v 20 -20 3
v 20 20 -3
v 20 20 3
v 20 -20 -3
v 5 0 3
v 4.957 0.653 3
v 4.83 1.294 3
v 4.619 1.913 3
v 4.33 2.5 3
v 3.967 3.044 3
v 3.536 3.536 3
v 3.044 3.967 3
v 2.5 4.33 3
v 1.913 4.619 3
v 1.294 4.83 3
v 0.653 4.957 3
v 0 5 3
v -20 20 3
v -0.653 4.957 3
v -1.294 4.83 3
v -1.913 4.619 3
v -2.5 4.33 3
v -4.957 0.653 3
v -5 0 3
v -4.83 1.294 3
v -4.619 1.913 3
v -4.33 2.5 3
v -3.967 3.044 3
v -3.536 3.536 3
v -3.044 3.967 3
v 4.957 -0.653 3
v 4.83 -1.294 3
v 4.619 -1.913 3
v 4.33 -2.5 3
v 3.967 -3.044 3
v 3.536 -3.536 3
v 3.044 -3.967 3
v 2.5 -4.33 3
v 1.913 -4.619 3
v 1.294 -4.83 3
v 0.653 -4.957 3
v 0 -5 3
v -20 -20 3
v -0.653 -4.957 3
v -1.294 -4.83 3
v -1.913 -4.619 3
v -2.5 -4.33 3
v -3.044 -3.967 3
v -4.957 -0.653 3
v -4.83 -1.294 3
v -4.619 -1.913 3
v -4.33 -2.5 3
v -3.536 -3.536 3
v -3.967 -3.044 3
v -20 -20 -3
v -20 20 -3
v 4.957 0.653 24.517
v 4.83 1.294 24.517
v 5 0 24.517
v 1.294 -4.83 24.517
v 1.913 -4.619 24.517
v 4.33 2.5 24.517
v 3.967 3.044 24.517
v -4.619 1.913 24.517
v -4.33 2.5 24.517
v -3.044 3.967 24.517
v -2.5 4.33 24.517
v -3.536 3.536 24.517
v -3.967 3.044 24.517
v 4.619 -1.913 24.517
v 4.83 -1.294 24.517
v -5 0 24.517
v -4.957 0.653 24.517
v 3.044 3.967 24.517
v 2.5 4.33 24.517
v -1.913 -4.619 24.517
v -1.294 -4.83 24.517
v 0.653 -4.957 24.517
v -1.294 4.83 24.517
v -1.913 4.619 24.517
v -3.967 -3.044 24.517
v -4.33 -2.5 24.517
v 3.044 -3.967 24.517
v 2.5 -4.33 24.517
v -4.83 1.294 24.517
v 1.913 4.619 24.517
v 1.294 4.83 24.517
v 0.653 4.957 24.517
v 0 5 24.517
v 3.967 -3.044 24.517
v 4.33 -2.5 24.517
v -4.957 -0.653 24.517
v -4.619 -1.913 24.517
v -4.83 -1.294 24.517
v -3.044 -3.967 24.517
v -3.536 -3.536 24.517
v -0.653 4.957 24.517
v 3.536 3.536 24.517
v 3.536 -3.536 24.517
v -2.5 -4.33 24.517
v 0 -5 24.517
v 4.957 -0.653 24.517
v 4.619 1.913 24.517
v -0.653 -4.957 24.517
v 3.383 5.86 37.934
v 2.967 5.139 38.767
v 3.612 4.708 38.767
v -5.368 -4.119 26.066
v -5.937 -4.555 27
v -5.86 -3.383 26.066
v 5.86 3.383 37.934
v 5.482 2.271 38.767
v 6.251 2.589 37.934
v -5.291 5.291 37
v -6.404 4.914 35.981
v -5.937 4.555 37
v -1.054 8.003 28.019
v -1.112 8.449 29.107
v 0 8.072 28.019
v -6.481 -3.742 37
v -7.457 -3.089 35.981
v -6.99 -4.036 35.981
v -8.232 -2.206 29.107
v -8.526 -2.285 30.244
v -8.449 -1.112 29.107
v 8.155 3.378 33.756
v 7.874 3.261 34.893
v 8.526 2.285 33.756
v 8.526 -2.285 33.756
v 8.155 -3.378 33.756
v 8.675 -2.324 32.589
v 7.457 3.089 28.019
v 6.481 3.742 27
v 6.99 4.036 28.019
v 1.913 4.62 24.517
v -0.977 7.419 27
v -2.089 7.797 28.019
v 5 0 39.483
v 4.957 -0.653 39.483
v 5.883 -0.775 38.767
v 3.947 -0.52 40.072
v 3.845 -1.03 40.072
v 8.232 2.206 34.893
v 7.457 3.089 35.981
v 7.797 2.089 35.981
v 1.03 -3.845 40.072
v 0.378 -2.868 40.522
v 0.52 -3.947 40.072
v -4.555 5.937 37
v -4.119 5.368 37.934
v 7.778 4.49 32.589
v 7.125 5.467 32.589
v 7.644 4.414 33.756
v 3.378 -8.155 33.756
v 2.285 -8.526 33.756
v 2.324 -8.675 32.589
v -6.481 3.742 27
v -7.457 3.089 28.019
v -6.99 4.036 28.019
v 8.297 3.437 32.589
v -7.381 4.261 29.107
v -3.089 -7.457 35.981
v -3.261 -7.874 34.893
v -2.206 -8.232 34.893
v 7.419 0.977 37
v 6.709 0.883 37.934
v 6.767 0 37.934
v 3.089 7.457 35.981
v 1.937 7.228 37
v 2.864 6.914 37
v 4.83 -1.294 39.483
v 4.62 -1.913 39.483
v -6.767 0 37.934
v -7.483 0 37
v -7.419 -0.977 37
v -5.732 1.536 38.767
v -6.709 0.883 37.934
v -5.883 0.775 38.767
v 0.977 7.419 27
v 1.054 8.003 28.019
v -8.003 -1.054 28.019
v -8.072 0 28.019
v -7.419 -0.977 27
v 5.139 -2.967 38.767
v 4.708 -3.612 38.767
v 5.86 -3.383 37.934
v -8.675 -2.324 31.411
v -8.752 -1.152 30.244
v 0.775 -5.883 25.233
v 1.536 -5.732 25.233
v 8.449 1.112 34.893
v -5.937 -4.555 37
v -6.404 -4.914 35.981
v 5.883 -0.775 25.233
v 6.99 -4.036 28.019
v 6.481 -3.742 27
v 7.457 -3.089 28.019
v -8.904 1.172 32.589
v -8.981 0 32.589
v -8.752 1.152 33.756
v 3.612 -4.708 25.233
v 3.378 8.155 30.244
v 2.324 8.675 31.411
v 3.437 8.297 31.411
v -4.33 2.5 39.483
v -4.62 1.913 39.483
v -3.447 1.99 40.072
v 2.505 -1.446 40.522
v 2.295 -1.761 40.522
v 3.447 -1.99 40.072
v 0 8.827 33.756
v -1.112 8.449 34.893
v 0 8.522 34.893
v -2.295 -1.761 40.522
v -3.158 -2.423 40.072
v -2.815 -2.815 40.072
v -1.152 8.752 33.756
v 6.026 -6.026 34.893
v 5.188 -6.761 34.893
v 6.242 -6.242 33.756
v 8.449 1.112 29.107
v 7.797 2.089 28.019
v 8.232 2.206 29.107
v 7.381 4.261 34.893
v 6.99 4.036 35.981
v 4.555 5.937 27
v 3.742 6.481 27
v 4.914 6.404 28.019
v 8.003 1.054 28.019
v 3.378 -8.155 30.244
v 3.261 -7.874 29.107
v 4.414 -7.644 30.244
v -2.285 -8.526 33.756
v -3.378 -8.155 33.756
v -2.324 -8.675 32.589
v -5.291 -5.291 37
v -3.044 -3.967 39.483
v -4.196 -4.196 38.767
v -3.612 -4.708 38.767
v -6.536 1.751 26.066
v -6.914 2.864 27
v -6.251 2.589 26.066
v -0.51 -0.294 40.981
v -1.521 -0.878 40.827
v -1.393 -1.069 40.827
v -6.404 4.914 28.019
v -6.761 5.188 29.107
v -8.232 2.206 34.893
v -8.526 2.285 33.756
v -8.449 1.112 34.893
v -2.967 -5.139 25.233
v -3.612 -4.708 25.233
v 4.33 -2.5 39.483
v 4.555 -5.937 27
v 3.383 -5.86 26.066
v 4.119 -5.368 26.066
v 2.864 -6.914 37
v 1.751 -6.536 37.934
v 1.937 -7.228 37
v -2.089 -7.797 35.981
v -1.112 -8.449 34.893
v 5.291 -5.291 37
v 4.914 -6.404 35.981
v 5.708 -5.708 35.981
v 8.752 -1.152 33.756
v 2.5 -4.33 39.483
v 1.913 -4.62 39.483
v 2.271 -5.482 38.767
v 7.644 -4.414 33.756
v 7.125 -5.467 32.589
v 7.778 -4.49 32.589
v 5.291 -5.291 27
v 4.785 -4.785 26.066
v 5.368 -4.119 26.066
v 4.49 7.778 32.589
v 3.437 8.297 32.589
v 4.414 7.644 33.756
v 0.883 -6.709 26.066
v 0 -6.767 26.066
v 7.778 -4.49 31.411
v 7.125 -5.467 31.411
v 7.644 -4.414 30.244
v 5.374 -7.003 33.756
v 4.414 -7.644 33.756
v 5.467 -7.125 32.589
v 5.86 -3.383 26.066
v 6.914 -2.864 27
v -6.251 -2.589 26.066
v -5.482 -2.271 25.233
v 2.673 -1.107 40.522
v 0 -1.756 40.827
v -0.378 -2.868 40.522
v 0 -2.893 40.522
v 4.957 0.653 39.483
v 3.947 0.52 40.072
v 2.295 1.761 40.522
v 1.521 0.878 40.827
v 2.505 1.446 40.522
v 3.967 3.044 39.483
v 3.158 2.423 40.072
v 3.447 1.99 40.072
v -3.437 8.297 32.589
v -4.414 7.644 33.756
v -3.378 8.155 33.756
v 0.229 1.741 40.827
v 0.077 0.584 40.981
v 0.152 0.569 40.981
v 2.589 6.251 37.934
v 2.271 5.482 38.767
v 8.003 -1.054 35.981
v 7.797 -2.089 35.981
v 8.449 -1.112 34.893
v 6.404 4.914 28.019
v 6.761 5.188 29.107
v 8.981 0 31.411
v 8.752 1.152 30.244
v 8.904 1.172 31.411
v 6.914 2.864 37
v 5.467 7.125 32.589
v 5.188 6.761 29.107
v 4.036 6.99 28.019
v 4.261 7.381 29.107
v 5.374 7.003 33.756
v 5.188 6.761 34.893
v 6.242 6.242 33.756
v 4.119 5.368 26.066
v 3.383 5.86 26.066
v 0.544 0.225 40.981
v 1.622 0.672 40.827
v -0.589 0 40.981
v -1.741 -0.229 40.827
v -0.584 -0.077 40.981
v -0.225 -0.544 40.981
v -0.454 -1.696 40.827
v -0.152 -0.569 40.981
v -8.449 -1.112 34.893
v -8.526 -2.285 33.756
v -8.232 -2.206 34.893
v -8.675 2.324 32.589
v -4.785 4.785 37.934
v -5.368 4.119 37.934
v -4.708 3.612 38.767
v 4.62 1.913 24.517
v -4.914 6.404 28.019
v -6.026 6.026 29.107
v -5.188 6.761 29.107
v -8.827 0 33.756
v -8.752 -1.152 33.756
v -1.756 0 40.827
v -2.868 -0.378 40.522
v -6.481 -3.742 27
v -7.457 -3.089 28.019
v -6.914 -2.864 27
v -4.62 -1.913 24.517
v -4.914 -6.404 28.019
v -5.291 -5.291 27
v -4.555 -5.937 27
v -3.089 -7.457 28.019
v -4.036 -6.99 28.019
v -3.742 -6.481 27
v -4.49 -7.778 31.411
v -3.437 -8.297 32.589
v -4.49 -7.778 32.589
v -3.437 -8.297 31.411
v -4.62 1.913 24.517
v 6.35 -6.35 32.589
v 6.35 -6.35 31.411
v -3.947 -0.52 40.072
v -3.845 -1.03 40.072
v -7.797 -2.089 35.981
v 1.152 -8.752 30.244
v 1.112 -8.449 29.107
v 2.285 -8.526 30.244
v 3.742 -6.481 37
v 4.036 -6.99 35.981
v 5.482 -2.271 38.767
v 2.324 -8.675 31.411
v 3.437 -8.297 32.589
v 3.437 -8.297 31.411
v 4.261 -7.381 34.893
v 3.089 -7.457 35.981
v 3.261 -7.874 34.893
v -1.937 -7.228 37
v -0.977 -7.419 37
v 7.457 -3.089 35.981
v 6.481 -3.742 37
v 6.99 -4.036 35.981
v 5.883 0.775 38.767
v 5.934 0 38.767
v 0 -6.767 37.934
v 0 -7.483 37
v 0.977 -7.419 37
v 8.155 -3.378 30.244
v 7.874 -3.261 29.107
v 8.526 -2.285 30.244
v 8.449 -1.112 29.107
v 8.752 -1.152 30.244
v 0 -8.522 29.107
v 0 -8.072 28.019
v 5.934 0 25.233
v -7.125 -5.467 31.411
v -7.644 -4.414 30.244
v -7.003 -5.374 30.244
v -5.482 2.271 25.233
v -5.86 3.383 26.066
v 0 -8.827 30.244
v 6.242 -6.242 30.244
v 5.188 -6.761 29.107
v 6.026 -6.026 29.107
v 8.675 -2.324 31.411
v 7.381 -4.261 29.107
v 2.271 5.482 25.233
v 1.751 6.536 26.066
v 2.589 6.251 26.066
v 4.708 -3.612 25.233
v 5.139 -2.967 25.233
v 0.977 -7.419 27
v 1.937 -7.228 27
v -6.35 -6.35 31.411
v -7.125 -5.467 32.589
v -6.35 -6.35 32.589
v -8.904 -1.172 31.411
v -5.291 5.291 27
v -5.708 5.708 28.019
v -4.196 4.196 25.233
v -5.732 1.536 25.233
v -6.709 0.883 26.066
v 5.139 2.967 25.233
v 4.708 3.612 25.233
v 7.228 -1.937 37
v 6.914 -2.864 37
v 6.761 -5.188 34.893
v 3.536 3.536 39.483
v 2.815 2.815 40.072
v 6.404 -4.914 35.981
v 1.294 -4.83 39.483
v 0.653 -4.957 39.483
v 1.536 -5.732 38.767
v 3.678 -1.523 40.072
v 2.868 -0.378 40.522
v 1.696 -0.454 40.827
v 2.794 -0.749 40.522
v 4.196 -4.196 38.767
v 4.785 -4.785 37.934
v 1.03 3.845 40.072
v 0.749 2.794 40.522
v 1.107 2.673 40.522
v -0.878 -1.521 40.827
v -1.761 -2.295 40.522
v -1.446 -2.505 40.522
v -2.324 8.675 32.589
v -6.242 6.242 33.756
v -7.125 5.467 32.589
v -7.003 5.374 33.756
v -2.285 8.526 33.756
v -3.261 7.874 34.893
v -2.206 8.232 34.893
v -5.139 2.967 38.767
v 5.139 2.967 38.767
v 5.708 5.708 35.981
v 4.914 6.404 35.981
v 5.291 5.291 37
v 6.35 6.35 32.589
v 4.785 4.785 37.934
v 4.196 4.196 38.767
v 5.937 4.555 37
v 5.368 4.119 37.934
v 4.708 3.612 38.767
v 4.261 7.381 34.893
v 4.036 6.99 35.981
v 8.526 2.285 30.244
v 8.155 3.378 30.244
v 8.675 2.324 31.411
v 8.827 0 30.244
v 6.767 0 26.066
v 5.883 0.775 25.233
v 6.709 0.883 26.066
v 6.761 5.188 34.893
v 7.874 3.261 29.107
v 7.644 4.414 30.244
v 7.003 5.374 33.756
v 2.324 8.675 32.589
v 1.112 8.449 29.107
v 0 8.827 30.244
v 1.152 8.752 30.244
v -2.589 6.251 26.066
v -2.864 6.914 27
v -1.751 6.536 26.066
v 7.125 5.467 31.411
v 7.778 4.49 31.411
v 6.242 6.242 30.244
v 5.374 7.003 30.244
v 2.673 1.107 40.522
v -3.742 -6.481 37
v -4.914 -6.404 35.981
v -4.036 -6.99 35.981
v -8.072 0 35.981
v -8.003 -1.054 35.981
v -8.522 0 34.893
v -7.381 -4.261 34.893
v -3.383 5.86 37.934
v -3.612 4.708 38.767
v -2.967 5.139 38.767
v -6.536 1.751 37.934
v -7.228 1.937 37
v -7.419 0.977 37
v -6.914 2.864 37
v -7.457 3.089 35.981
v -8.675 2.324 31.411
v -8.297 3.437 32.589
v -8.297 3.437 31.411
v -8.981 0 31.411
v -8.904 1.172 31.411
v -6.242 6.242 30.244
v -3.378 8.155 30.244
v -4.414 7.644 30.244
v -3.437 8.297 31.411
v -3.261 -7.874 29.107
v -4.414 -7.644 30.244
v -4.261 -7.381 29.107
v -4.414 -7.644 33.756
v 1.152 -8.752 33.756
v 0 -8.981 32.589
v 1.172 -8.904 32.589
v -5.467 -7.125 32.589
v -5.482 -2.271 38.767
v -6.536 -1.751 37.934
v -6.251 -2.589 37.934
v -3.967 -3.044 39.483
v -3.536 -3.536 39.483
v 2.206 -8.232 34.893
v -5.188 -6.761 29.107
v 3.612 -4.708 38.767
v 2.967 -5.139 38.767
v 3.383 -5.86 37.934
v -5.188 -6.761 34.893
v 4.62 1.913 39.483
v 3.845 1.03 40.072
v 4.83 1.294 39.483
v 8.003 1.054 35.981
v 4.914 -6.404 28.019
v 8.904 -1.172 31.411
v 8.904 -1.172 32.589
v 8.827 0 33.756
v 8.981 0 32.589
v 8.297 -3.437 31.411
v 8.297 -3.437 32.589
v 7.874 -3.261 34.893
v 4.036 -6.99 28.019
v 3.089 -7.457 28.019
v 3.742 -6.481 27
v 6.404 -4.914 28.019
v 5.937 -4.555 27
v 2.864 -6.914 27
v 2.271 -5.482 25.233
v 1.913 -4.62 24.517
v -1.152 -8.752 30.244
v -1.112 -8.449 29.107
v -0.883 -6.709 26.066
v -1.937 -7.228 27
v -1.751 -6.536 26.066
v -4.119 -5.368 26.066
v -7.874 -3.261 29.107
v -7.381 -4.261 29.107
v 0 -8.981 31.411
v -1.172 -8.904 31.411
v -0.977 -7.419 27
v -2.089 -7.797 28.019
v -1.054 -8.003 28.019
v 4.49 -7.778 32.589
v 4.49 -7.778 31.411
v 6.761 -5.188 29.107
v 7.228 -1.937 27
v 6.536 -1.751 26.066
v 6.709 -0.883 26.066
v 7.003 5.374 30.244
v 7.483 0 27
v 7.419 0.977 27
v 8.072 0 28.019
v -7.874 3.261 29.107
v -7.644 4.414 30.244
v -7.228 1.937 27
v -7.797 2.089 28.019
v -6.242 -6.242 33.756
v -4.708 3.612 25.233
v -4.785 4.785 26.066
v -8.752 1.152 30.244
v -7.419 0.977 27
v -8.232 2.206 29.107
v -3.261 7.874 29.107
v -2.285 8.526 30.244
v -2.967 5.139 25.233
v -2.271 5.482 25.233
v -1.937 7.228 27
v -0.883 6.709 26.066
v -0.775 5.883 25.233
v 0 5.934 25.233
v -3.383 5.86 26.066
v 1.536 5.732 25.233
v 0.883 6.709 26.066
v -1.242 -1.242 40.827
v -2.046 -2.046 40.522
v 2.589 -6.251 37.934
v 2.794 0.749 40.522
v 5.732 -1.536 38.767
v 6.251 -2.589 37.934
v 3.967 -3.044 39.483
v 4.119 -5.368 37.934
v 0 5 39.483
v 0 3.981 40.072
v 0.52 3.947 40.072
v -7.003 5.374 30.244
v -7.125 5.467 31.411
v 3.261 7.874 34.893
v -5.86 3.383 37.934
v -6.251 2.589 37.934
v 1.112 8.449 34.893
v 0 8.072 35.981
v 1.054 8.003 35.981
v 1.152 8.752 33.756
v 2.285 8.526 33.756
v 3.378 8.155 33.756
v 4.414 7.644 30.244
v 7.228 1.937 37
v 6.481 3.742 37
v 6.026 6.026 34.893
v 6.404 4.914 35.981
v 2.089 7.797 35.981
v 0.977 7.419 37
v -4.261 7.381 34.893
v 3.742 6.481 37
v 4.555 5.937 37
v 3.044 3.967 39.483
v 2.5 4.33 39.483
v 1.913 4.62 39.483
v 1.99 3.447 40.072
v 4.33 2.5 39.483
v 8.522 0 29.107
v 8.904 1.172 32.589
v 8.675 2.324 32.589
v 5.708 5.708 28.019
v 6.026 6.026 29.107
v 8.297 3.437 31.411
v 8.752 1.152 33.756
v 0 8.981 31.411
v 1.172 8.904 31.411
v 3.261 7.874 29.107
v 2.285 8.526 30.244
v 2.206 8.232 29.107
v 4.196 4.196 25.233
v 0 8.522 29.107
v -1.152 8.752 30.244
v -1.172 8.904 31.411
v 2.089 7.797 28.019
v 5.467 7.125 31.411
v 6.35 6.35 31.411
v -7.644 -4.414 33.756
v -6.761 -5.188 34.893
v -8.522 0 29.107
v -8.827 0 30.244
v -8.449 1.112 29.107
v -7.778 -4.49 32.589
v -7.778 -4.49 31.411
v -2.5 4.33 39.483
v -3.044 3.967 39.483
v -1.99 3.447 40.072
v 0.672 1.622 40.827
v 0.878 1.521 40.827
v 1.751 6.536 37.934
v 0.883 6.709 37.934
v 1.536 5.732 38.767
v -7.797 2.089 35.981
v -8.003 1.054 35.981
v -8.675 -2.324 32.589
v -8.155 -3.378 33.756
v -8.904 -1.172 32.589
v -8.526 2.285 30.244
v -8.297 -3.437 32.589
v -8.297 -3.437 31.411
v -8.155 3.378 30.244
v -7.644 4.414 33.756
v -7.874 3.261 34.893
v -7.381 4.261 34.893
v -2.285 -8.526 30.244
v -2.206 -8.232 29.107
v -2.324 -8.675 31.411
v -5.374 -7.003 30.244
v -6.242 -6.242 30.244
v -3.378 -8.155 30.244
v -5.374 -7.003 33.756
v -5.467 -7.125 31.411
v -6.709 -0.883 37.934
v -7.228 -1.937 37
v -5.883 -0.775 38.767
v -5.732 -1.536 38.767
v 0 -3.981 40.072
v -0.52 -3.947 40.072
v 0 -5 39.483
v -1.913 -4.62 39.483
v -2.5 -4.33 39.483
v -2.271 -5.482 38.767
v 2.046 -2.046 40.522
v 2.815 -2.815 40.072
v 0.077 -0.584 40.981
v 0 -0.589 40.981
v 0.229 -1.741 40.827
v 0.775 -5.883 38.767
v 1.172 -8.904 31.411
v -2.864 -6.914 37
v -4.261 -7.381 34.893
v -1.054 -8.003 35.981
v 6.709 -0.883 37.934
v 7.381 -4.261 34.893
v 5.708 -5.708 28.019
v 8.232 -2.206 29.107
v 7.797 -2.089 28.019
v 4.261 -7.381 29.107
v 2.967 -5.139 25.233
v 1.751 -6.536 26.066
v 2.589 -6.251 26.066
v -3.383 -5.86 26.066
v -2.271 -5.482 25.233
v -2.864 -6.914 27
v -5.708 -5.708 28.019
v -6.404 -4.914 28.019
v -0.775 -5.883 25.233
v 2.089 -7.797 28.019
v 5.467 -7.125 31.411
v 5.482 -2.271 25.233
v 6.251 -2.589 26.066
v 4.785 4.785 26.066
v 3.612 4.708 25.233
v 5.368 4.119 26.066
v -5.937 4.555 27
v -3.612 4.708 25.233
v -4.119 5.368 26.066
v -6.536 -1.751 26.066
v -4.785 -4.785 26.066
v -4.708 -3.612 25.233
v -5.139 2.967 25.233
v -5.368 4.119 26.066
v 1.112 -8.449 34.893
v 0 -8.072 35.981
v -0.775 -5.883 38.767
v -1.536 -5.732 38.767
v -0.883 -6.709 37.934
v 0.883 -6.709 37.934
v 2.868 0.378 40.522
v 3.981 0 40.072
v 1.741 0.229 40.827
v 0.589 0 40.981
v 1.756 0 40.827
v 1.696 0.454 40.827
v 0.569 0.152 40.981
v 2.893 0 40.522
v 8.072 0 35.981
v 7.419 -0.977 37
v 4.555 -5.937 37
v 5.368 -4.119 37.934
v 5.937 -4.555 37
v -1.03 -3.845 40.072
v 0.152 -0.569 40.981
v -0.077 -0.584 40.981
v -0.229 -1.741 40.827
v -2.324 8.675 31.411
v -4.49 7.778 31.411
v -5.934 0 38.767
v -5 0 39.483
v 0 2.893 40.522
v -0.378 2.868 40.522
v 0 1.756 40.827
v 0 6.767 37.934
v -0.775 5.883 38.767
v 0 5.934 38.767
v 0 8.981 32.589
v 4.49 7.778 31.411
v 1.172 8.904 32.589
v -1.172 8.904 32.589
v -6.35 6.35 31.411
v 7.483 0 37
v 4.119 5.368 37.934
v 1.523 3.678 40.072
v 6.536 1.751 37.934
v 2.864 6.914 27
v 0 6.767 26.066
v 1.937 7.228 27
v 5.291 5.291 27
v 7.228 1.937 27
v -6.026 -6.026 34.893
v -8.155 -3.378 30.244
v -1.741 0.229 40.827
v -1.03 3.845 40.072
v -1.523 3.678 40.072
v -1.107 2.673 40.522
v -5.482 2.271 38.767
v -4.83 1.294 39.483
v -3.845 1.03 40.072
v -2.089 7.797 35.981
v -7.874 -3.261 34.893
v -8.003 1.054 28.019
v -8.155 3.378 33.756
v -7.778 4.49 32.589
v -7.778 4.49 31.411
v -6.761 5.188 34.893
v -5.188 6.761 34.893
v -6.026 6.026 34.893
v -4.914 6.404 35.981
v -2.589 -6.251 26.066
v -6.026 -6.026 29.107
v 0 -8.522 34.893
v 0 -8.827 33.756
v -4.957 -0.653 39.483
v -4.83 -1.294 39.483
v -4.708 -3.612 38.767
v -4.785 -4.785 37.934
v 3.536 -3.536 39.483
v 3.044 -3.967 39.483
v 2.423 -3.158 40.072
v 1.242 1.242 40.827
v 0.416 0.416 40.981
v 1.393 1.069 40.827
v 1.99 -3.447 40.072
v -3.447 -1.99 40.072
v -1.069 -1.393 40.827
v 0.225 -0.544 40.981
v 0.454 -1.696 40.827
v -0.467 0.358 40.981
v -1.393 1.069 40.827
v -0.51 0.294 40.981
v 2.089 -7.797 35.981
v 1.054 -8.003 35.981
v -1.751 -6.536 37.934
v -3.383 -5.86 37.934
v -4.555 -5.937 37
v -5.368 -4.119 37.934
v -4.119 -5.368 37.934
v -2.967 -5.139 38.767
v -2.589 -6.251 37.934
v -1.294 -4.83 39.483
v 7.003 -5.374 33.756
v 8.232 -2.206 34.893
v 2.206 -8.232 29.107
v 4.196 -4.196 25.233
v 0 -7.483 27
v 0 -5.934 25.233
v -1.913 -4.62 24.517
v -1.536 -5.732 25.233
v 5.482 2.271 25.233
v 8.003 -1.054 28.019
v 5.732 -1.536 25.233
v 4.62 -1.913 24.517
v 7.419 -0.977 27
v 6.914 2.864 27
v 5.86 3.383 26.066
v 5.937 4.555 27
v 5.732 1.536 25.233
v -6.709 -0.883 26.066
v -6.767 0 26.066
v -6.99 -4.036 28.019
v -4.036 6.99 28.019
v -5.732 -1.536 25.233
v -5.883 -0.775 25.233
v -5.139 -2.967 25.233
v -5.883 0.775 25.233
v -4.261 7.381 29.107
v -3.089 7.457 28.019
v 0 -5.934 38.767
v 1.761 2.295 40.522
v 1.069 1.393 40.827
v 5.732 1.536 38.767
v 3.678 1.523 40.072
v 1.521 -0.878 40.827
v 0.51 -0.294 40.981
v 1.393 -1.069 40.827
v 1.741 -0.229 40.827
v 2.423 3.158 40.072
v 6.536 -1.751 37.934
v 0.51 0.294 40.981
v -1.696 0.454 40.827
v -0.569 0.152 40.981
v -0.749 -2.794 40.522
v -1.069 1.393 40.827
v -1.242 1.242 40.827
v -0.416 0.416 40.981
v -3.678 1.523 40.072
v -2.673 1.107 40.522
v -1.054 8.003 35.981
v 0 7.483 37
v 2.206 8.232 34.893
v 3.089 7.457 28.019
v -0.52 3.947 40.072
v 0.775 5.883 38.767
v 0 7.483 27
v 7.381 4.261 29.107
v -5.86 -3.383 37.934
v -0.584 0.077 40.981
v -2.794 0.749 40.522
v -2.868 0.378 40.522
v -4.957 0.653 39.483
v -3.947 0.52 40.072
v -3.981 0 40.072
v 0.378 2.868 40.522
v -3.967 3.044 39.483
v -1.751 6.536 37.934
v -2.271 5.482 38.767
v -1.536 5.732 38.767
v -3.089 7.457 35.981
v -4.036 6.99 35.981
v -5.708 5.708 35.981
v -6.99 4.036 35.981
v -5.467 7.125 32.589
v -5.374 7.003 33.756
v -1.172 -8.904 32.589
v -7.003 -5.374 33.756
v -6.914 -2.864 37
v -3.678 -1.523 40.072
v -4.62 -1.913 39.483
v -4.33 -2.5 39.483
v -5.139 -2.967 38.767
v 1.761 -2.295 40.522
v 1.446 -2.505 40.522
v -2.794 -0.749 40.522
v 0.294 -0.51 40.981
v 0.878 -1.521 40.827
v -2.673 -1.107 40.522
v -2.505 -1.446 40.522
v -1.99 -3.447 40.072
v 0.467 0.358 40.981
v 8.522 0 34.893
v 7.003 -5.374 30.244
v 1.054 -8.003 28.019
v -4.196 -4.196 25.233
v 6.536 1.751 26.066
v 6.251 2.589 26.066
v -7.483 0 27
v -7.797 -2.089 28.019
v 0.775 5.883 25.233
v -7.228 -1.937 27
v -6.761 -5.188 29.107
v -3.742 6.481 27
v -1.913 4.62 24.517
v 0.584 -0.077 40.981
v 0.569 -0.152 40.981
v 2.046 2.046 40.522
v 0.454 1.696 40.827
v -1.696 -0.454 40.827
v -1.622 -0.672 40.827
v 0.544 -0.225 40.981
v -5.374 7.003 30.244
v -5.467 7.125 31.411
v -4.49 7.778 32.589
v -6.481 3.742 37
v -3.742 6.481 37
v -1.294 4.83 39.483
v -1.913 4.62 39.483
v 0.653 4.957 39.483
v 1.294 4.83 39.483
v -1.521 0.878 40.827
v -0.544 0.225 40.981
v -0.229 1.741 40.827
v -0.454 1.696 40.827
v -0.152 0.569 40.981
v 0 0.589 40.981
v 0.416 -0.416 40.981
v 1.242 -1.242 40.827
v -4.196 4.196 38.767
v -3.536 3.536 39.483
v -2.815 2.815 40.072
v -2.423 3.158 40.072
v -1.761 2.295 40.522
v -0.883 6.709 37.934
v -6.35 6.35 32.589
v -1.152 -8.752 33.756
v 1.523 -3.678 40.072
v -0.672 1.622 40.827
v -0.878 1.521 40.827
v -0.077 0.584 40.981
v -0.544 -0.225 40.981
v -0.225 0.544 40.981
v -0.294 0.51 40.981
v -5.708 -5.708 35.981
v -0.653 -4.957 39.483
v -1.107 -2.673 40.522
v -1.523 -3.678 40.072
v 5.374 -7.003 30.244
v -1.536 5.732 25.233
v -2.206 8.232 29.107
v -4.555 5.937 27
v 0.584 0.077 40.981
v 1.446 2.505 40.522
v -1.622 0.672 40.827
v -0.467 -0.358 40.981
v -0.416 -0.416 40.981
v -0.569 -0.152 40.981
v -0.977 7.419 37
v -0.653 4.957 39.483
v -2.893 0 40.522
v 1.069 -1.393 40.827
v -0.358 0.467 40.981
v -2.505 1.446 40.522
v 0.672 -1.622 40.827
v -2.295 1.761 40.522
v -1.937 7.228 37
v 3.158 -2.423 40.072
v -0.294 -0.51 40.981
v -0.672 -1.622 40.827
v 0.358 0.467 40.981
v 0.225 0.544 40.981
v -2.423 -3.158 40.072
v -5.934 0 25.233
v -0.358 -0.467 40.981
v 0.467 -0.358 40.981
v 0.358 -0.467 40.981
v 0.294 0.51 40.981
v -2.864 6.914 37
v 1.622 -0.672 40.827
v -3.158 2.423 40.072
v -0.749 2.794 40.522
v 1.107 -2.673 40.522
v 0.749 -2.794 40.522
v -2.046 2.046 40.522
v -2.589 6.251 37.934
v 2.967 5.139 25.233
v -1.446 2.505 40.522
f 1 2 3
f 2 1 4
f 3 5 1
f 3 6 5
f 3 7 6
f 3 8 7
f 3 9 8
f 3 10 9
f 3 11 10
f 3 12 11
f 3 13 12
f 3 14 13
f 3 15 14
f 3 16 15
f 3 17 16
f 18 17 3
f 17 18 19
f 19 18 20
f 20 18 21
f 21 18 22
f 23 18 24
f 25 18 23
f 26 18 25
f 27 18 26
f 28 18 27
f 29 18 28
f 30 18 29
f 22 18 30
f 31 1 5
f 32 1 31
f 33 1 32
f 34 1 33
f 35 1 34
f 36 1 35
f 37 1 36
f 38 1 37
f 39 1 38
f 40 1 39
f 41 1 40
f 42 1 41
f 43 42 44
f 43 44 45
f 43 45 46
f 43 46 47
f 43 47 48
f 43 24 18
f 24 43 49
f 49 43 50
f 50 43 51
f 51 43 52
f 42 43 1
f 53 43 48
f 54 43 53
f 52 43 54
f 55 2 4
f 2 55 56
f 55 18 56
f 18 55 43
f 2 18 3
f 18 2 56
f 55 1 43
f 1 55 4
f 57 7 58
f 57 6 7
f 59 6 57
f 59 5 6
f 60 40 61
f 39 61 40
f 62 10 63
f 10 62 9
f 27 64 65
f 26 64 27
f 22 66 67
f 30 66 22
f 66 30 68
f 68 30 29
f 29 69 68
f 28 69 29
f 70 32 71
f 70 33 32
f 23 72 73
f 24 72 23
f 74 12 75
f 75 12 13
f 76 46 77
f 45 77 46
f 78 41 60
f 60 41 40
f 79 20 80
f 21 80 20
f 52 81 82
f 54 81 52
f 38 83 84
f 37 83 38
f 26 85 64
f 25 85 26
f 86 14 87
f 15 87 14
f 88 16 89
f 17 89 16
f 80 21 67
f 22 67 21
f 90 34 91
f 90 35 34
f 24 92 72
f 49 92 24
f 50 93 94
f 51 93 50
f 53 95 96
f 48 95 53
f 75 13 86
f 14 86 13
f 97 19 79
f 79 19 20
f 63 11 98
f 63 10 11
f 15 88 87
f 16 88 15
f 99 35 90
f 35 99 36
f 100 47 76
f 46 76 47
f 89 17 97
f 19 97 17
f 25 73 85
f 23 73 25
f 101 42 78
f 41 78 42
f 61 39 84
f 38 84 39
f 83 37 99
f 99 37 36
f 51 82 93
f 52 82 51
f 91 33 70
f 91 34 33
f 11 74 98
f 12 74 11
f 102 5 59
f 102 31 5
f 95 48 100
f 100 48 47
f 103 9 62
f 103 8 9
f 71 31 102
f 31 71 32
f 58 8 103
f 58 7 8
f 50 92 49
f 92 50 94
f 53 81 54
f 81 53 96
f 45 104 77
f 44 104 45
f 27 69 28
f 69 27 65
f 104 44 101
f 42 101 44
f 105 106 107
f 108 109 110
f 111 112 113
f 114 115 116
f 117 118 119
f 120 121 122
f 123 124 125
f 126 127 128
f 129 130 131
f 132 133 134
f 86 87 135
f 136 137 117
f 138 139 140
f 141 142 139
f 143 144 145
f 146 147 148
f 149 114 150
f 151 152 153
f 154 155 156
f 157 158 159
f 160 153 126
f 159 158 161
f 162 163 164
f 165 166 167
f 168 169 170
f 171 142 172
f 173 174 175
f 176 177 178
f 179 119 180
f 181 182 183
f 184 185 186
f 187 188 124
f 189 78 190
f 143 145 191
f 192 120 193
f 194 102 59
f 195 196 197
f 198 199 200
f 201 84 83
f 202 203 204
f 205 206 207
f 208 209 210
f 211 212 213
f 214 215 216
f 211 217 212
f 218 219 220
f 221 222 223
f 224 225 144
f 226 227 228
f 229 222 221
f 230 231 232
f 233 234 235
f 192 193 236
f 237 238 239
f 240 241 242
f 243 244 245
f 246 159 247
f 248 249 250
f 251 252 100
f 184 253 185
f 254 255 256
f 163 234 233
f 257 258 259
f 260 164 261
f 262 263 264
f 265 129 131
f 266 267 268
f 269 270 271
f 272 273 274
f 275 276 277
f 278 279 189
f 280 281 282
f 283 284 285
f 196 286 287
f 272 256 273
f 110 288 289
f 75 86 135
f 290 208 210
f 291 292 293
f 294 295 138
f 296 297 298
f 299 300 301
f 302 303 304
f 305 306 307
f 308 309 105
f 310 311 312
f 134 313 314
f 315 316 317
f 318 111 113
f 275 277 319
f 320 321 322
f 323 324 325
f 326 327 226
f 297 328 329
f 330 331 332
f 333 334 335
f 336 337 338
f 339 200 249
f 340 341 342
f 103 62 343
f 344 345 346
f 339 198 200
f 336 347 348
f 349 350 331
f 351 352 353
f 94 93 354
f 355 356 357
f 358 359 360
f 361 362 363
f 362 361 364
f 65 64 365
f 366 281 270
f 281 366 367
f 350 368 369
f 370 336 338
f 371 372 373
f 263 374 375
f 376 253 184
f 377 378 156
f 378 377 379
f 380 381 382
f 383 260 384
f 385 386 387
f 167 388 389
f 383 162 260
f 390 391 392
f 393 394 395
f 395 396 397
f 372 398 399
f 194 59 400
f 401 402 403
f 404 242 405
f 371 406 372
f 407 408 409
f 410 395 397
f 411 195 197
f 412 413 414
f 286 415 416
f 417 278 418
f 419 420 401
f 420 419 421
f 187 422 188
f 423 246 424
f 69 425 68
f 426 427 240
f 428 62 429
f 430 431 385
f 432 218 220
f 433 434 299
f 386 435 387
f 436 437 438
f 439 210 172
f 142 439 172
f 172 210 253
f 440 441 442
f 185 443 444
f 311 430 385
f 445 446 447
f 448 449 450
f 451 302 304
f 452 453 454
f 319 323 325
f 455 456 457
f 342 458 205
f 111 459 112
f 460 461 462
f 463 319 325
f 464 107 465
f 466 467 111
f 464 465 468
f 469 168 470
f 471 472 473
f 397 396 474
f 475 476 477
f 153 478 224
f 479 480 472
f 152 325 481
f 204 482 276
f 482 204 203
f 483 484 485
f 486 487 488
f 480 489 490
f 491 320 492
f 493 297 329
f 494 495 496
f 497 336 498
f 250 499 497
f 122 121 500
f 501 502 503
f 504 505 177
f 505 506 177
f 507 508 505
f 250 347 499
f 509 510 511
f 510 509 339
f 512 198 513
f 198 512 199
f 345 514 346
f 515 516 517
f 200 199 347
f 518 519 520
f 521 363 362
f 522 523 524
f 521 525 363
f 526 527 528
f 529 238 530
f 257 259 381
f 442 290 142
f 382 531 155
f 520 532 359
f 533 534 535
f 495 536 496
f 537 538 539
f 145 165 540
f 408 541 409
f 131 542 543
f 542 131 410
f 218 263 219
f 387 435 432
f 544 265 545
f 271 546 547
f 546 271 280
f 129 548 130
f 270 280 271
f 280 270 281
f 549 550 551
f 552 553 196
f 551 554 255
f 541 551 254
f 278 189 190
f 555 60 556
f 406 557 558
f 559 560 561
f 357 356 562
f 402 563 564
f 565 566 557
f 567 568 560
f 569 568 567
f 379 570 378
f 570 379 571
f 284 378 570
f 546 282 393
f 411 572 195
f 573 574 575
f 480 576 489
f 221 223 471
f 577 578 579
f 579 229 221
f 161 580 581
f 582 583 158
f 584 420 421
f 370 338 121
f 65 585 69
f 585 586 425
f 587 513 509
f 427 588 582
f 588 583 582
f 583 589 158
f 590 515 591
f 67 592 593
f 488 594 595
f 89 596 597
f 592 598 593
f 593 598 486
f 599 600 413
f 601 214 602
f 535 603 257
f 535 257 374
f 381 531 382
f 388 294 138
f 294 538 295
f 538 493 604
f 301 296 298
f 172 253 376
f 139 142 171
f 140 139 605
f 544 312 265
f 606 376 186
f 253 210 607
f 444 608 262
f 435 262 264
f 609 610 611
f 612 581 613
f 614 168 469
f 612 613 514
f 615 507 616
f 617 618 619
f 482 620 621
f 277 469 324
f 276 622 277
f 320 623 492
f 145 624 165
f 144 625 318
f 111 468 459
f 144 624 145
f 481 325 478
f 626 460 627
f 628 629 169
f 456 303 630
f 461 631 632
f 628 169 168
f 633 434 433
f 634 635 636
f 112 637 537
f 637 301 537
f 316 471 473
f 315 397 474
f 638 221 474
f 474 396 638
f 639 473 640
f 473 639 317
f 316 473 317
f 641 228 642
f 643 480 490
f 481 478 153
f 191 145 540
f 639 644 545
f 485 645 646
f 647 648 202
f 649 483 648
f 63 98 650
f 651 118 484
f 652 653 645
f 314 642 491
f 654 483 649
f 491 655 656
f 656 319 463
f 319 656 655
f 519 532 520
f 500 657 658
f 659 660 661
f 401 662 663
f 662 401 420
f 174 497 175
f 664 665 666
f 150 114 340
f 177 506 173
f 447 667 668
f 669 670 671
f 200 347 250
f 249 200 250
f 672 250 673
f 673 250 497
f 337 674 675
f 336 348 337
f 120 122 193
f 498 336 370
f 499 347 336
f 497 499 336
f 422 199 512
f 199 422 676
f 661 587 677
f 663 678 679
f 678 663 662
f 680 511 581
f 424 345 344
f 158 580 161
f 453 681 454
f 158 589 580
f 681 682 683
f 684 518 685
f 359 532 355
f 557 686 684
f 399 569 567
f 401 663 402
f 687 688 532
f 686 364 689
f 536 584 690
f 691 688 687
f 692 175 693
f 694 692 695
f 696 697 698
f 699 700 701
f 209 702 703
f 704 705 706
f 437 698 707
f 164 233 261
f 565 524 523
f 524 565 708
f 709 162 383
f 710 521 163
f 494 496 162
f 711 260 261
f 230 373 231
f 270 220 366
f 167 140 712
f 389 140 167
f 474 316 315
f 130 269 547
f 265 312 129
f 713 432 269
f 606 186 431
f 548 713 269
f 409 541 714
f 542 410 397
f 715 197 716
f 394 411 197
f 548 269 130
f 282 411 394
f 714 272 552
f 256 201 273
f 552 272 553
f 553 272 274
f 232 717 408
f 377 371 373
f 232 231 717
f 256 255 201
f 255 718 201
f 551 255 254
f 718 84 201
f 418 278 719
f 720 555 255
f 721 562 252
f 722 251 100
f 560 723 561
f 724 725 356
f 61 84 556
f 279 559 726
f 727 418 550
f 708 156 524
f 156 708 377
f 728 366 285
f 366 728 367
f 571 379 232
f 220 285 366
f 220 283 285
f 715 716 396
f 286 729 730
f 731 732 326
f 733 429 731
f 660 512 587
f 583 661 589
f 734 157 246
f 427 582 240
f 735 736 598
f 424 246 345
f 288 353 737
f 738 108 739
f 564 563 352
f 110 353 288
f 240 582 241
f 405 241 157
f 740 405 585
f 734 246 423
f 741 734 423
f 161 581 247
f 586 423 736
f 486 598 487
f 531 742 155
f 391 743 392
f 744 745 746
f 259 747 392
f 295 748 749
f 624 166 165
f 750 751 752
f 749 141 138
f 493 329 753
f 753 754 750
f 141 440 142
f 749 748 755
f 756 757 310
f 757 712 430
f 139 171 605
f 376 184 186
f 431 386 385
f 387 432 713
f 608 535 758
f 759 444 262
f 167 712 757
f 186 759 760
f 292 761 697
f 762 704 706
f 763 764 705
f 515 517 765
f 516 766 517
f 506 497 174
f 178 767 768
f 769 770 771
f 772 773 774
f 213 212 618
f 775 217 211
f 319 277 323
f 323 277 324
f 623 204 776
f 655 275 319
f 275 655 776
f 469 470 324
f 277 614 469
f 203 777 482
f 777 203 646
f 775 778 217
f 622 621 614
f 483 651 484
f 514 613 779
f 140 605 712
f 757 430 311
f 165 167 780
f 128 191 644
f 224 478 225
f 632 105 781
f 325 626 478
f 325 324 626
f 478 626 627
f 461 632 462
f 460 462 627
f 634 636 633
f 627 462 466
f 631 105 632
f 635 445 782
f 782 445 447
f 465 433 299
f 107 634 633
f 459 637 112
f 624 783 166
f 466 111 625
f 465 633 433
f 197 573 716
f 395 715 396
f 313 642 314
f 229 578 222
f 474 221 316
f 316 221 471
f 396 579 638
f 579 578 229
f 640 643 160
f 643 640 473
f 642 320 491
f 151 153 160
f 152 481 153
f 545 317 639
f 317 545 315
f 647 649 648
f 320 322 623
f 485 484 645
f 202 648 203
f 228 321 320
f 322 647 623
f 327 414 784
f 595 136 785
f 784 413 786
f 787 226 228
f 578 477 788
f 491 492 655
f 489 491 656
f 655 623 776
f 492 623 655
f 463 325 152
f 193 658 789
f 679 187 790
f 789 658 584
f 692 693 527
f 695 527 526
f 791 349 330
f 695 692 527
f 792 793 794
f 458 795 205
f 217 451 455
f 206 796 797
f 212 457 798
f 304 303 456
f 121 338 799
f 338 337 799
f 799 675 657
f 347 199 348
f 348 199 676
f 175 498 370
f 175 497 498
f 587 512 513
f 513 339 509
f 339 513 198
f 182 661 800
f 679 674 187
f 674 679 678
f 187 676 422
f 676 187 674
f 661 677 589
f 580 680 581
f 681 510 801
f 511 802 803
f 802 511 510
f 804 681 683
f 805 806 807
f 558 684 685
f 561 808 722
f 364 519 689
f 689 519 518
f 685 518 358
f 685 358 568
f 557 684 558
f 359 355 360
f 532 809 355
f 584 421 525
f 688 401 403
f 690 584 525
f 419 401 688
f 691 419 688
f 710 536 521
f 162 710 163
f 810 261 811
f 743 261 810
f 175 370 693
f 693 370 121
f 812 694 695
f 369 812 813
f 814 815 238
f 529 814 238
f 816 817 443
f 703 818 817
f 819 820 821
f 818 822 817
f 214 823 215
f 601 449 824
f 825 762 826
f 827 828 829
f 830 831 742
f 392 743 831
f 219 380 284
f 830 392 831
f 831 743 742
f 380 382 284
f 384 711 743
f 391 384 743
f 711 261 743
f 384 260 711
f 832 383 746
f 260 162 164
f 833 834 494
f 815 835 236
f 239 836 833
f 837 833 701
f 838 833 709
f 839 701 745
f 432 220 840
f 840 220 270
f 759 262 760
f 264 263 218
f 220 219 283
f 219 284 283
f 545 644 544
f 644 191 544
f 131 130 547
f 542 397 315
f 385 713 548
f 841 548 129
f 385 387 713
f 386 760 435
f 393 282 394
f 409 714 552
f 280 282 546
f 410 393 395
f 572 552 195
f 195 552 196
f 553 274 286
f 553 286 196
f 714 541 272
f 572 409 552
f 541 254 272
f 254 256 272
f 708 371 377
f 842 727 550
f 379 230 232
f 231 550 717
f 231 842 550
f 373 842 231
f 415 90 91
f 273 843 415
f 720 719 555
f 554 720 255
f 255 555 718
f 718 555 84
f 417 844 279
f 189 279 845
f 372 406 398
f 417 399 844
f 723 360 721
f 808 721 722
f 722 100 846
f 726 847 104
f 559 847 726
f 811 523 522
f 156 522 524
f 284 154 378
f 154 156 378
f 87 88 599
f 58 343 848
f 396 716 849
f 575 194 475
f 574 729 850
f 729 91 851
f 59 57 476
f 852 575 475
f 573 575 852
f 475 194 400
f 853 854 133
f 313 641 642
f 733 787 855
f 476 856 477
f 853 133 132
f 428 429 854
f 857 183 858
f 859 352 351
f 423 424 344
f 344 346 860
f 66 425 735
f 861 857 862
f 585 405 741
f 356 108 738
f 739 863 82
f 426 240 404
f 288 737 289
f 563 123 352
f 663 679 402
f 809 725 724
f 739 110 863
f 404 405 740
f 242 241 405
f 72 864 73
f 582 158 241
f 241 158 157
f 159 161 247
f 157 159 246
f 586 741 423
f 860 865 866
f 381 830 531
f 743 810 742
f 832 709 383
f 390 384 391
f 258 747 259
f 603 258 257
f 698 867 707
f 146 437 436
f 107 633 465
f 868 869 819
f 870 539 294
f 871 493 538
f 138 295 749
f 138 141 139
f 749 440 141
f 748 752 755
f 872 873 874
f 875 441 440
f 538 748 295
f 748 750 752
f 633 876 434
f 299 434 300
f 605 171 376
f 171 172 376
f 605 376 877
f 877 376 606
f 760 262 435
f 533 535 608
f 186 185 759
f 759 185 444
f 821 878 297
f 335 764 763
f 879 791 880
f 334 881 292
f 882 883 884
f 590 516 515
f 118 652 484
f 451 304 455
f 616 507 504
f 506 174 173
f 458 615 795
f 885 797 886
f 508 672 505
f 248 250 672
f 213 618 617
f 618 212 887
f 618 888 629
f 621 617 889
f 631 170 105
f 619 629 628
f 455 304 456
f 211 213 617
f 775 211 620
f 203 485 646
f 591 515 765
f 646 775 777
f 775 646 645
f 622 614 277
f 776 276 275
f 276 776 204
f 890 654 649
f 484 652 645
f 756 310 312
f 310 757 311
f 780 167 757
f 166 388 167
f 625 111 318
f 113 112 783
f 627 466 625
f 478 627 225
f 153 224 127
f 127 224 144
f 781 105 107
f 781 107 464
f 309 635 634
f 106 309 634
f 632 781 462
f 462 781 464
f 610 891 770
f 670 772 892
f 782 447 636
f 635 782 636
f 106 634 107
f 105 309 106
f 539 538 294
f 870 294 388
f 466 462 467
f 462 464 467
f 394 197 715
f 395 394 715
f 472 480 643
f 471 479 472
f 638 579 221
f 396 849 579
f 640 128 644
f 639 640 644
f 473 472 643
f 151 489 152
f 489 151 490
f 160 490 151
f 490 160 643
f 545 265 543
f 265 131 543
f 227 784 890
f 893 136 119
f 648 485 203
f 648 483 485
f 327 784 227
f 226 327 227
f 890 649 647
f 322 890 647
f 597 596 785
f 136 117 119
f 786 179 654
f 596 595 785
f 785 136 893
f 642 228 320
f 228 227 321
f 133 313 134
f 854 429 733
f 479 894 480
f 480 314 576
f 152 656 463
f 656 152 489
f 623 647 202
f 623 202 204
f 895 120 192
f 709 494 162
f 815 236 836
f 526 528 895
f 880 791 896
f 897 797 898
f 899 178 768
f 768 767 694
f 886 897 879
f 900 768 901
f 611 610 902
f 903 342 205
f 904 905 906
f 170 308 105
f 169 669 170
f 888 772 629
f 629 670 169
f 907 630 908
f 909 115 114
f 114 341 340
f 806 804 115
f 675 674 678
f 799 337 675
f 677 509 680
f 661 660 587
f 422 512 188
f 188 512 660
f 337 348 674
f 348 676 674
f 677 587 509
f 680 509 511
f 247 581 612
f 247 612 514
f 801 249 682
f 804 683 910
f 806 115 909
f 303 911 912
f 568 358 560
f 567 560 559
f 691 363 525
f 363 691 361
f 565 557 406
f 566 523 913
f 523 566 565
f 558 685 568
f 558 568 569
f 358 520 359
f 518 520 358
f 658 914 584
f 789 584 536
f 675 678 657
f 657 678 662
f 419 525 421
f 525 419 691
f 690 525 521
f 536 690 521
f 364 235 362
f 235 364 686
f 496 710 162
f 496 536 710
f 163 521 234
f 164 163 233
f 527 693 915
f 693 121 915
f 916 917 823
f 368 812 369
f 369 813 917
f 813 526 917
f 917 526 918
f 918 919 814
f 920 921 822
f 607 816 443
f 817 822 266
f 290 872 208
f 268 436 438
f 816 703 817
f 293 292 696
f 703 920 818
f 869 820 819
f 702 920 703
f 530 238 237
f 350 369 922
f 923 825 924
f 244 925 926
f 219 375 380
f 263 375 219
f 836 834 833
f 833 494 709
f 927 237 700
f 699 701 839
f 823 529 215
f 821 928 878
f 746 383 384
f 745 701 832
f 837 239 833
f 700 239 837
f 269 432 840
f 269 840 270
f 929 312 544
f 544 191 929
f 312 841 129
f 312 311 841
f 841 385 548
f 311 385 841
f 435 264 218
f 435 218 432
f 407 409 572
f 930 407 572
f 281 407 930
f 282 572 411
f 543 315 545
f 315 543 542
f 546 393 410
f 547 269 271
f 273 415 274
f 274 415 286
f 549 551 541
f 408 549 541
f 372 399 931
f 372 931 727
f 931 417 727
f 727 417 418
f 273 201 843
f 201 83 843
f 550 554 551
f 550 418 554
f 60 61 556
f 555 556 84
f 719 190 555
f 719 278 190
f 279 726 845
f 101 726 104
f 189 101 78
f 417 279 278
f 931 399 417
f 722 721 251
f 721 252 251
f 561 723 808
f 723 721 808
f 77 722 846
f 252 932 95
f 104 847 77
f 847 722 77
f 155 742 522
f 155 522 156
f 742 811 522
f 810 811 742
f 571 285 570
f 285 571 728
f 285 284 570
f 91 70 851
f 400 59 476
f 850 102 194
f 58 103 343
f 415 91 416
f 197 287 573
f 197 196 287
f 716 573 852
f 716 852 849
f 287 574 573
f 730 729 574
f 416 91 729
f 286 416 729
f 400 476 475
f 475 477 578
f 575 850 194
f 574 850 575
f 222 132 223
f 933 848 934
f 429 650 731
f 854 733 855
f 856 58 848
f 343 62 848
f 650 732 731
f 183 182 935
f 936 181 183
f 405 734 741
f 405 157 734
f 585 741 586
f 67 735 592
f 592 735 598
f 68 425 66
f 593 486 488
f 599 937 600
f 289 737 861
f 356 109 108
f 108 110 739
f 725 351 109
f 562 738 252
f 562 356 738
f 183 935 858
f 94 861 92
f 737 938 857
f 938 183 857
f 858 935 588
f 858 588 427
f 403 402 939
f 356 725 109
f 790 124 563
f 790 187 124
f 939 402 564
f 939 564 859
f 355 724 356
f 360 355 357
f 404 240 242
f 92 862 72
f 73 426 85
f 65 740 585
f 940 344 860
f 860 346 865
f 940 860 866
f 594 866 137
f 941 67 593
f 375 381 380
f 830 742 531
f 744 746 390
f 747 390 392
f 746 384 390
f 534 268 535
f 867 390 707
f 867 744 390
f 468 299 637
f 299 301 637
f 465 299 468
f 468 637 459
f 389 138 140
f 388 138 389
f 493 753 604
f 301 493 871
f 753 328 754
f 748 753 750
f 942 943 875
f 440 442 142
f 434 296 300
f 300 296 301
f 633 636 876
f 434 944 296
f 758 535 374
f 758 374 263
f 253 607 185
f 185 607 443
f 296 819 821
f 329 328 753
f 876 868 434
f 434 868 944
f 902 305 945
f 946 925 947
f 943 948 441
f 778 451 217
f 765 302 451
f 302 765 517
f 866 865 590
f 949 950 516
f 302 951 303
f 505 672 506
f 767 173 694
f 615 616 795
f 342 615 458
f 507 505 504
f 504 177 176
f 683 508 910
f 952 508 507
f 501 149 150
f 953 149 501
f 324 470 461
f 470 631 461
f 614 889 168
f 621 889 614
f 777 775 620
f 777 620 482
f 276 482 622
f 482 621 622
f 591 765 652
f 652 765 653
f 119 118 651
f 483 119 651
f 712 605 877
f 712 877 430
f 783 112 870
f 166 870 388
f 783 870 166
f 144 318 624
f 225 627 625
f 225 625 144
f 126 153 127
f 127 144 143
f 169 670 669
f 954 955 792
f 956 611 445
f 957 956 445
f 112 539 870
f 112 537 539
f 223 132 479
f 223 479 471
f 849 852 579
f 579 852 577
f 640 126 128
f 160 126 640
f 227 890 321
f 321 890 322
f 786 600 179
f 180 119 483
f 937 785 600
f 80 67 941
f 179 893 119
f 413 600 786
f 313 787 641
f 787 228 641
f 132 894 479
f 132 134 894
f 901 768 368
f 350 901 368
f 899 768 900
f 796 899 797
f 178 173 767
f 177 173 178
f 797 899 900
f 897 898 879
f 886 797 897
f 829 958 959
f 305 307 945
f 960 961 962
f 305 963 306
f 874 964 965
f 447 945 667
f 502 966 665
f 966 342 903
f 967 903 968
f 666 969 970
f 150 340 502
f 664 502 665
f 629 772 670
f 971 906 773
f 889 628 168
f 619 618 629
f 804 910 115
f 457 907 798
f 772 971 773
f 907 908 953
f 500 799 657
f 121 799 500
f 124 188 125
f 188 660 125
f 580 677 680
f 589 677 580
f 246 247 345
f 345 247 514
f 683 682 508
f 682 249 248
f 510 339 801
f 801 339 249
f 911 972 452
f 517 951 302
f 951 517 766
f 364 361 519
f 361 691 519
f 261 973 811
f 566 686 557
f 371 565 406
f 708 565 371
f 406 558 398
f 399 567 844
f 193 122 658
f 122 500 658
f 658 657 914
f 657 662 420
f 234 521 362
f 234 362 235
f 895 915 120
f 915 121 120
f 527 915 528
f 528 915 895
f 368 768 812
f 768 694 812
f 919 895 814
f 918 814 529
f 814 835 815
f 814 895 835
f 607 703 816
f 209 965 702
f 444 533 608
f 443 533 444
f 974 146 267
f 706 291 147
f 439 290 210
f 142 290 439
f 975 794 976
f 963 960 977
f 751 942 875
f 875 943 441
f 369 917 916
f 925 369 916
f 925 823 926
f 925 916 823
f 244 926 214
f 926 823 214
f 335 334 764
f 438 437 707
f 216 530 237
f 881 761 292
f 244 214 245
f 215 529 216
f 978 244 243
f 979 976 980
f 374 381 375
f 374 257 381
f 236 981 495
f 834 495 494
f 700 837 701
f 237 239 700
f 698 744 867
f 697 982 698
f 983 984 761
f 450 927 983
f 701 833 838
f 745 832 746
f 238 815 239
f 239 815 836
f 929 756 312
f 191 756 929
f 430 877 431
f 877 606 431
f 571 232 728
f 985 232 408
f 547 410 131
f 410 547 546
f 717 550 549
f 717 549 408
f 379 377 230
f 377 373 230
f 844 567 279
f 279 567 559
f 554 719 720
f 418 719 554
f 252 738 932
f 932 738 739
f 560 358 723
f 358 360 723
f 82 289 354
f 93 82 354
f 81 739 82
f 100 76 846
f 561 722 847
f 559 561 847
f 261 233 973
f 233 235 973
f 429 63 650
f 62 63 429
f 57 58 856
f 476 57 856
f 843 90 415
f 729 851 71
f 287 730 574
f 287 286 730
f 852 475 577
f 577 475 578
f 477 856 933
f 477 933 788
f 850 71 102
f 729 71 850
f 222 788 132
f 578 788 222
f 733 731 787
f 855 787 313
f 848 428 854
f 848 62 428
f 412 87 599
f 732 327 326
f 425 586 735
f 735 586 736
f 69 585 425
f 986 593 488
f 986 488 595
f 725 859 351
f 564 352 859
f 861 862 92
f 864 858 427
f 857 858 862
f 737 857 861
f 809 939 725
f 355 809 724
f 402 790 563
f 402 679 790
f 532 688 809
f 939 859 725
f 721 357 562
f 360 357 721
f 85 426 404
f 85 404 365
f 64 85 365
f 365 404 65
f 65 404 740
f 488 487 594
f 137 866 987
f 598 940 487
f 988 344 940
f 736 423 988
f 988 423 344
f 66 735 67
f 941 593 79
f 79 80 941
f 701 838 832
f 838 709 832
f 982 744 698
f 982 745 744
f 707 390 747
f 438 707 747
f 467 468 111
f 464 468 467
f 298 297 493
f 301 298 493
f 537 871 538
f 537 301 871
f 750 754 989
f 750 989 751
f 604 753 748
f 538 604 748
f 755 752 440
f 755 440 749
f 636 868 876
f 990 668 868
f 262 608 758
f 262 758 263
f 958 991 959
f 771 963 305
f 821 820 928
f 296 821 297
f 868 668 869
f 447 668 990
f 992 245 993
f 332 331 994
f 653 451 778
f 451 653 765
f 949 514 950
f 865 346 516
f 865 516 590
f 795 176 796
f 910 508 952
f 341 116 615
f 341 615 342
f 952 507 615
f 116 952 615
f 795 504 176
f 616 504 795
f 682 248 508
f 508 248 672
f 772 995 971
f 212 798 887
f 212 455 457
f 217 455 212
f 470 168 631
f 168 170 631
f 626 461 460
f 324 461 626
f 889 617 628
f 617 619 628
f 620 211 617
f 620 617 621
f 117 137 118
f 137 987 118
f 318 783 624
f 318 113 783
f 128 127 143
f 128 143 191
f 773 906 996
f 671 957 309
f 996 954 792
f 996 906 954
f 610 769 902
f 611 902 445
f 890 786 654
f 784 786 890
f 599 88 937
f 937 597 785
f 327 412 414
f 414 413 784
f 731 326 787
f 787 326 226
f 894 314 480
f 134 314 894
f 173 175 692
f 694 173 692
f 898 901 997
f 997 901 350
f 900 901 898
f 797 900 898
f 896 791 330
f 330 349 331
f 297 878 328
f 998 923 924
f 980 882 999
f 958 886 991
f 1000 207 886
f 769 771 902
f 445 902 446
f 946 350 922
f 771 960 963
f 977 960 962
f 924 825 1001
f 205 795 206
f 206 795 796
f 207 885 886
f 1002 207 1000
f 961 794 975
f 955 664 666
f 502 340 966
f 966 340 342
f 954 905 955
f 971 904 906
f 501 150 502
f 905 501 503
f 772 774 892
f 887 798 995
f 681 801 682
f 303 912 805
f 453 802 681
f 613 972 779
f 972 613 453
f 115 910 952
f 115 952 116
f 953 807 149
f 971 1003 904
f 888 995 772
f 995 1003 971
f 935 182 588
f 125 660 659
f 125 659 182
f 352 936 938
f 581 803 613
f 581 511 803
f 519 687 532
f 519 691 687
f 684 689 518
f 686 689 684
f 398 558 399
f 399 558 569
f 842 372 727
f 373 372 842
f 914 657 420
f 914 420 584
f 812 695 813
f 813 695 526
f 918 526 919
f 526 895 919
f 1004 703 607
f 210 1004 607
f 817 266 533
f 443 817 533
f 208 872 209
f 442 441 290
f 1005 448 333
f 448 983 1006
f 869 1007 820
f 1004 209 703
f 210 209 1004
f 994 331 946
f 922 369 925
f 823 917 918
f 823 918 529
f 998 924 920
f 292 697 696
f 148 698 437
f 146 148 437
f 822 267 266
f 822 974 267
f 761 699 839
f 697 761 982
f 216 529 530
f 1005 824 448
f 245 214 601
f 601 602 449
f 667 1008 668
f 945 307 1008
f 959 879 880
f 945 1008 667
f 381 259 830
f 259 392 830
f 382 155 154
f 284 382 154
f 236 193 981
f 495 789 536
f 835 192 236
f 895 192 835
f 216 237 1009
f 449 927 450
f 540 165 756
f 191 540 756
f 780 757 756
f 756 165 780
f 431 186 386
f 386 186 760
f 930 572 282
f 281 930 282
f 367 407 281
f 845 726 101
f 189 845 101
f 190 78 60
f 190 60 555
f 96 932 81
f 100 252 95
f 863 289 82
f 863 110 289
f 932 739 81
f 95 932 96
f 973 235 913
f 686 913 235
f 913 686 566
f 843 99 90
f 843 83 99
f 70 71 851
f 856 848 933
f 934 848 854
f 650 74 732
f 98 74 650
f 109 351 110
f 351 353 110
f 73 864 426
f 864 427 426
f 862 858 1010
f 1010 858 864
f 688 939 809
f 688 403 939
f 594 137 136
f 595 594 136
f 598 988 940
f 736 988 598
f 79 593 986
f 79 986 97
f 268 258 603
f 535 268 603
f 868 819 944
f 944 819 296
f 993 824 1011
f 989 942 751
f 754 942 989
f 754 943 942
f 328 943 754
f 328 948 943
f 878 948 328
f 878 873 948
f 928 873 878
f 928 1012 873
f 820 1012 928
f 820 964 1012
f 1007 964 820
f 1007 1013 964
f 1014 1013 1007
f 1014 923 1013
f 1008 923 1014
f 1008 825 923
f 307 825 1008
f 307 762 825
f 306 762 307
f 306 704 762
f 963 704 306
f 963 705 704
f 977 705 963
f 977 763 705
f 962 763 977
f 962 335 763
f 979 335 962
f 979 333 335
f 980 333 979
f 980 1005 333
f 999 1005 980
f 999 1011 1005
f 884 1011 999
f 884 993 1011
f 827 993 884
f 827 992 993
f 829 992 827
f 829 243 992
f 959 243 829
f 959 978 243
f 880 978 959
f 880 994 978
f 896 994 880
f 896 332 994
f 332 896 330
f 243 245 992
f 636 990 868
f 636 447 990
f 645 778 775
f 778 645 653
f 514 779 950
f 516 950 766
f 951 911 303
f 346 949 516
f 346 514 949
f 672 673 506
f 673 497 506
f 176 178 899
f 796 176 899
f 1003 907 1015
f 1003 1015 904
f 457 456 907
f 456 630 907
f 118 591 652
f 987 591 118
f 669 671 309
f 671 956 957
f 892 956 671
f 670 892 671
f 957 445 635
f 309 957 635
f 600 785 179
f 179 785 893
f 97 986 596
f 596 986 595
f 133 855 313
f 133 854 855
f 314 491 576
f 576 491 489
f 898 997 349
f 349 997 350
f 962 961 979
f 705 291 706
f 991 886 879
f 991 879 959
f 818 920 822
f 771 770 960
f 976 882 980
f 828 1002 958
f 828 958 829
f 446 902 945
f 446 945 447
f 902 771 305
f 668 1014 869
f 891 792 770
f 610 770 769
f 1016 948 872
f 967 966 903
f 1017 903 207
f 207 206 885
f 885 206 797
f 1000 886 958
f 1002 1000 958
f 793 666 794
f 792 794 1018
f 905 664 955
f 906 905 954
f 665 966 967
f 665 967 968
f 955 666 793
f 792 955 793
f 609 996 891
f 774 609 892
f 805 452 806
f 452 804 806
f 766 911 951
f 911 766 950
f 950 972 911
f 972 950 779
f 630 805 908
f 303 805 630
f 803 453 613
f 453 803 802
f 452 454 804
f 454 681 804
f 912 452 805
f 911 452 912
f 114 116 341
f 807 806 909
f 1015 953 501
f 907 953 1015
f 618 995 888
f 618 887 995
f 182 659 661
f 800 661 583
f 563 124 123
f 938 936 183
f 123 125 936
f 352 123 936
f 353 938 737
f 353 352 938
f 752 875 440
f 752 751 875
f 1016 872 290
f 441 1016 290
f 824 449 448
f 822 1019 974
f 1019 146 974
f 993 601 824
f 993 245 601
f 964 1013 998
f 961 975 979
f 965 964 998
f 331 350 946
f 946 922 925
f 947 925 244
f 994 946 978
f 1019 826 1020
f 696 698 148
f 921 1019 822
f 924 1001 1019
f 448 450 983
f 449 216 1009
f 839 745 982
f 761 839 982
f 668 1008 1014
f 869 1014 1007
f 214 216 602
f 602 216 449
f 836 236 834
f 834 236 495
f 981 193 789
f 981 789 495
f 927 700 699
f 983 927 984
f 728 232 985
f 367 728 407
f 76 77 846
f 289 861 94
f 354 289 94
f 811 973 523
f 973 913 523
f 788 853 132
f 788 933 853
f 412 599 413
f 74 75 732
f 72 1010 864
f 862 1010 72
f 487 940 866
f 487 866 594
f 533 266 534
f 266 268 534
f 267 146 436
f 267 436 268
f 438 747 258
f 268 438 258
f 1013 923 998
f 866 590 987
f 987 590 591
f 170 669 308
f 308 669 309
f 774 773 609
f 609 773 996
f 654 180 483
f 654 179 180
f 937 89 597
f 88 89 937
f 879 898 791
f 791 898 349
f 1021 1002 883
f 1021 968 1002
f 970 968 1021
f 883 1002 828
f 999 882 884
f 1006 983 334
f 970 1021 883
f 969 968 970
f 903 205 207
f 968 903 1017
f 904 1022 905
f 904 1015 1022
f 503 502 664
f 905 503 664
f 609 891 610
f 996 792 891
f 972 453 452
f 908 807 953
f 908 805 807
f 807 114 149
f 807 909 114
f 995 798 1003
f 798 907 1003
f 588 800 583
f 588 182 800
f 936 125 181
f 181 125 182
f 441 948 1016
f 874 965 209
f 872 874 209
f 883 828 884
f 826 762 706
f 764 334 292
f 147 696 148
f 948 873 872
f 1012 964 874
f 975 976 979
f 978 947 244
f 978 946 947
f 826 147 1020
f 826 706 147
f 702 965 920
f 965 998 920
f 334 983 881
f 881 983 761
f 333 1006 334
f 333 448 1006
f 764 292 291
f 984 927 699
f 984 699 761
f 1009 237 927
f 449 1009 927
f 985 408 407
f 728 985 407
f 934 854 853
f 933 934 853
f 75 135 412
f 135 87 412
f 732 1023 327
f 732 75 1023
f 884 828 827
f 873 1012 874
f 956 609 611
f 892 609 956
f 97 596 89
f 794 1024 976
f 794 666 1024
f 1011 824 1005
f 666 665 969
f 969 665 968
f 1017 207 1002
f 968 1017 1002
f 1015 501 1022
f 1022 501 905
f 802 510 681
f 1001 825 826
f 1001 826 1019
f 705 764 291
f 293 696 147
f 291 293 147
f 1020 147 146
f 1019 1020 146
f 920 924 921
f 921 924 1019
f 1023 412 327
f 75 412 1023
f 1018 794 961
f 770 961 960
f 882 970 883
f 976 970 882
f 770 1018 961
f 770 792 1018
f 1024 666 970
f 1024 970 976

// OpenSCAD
// 2회차 드라이런 검증용 모델 — OpenSCAD Playground → GLB 경로 확인
//
// 확인한 것 (2026-10-11):
//   - ochafik.com/openscad2 에서 로그인 없이 Render → Download GLB 가능
//   - color() 세 개가 GLB에 PBR material 3개로 그대로 들어간다
//     SteelBlue → baseColorFactor [0.275, 0.510, 0.706, 1]
//     Tomato    → [1, 0.388, 0.278, 1]
//     Gold      → [1, 0.843, 0, 1]
//   - 결과 46.2 KB · 삼각형 2,500 · 정점 1,256 · 텍스처 0장
//     → Arrival.Space 최적화 가이드("텍스처 1K 이하, 512 권장")를 자동으로 만족
//
// 수업에서 쓰는 법: 학생이 Codex에게 "이런 모양을 OpenSCAD로 만들어 줘"라고 시키고,
// 받은 코드를 Playground에 붙여 Render → Download GLB → Arrival.Space 업로드.

$fn = 48;

color("SteelBlue")
  cube([40, 40, 6], center = true);

color("Tomato")
  translate([0, 0, 15])
    cylinder(h = 24, r = 5, center = true);

color("Gold")
  translate([0, 0, 32])
    sphere(r = 9);
